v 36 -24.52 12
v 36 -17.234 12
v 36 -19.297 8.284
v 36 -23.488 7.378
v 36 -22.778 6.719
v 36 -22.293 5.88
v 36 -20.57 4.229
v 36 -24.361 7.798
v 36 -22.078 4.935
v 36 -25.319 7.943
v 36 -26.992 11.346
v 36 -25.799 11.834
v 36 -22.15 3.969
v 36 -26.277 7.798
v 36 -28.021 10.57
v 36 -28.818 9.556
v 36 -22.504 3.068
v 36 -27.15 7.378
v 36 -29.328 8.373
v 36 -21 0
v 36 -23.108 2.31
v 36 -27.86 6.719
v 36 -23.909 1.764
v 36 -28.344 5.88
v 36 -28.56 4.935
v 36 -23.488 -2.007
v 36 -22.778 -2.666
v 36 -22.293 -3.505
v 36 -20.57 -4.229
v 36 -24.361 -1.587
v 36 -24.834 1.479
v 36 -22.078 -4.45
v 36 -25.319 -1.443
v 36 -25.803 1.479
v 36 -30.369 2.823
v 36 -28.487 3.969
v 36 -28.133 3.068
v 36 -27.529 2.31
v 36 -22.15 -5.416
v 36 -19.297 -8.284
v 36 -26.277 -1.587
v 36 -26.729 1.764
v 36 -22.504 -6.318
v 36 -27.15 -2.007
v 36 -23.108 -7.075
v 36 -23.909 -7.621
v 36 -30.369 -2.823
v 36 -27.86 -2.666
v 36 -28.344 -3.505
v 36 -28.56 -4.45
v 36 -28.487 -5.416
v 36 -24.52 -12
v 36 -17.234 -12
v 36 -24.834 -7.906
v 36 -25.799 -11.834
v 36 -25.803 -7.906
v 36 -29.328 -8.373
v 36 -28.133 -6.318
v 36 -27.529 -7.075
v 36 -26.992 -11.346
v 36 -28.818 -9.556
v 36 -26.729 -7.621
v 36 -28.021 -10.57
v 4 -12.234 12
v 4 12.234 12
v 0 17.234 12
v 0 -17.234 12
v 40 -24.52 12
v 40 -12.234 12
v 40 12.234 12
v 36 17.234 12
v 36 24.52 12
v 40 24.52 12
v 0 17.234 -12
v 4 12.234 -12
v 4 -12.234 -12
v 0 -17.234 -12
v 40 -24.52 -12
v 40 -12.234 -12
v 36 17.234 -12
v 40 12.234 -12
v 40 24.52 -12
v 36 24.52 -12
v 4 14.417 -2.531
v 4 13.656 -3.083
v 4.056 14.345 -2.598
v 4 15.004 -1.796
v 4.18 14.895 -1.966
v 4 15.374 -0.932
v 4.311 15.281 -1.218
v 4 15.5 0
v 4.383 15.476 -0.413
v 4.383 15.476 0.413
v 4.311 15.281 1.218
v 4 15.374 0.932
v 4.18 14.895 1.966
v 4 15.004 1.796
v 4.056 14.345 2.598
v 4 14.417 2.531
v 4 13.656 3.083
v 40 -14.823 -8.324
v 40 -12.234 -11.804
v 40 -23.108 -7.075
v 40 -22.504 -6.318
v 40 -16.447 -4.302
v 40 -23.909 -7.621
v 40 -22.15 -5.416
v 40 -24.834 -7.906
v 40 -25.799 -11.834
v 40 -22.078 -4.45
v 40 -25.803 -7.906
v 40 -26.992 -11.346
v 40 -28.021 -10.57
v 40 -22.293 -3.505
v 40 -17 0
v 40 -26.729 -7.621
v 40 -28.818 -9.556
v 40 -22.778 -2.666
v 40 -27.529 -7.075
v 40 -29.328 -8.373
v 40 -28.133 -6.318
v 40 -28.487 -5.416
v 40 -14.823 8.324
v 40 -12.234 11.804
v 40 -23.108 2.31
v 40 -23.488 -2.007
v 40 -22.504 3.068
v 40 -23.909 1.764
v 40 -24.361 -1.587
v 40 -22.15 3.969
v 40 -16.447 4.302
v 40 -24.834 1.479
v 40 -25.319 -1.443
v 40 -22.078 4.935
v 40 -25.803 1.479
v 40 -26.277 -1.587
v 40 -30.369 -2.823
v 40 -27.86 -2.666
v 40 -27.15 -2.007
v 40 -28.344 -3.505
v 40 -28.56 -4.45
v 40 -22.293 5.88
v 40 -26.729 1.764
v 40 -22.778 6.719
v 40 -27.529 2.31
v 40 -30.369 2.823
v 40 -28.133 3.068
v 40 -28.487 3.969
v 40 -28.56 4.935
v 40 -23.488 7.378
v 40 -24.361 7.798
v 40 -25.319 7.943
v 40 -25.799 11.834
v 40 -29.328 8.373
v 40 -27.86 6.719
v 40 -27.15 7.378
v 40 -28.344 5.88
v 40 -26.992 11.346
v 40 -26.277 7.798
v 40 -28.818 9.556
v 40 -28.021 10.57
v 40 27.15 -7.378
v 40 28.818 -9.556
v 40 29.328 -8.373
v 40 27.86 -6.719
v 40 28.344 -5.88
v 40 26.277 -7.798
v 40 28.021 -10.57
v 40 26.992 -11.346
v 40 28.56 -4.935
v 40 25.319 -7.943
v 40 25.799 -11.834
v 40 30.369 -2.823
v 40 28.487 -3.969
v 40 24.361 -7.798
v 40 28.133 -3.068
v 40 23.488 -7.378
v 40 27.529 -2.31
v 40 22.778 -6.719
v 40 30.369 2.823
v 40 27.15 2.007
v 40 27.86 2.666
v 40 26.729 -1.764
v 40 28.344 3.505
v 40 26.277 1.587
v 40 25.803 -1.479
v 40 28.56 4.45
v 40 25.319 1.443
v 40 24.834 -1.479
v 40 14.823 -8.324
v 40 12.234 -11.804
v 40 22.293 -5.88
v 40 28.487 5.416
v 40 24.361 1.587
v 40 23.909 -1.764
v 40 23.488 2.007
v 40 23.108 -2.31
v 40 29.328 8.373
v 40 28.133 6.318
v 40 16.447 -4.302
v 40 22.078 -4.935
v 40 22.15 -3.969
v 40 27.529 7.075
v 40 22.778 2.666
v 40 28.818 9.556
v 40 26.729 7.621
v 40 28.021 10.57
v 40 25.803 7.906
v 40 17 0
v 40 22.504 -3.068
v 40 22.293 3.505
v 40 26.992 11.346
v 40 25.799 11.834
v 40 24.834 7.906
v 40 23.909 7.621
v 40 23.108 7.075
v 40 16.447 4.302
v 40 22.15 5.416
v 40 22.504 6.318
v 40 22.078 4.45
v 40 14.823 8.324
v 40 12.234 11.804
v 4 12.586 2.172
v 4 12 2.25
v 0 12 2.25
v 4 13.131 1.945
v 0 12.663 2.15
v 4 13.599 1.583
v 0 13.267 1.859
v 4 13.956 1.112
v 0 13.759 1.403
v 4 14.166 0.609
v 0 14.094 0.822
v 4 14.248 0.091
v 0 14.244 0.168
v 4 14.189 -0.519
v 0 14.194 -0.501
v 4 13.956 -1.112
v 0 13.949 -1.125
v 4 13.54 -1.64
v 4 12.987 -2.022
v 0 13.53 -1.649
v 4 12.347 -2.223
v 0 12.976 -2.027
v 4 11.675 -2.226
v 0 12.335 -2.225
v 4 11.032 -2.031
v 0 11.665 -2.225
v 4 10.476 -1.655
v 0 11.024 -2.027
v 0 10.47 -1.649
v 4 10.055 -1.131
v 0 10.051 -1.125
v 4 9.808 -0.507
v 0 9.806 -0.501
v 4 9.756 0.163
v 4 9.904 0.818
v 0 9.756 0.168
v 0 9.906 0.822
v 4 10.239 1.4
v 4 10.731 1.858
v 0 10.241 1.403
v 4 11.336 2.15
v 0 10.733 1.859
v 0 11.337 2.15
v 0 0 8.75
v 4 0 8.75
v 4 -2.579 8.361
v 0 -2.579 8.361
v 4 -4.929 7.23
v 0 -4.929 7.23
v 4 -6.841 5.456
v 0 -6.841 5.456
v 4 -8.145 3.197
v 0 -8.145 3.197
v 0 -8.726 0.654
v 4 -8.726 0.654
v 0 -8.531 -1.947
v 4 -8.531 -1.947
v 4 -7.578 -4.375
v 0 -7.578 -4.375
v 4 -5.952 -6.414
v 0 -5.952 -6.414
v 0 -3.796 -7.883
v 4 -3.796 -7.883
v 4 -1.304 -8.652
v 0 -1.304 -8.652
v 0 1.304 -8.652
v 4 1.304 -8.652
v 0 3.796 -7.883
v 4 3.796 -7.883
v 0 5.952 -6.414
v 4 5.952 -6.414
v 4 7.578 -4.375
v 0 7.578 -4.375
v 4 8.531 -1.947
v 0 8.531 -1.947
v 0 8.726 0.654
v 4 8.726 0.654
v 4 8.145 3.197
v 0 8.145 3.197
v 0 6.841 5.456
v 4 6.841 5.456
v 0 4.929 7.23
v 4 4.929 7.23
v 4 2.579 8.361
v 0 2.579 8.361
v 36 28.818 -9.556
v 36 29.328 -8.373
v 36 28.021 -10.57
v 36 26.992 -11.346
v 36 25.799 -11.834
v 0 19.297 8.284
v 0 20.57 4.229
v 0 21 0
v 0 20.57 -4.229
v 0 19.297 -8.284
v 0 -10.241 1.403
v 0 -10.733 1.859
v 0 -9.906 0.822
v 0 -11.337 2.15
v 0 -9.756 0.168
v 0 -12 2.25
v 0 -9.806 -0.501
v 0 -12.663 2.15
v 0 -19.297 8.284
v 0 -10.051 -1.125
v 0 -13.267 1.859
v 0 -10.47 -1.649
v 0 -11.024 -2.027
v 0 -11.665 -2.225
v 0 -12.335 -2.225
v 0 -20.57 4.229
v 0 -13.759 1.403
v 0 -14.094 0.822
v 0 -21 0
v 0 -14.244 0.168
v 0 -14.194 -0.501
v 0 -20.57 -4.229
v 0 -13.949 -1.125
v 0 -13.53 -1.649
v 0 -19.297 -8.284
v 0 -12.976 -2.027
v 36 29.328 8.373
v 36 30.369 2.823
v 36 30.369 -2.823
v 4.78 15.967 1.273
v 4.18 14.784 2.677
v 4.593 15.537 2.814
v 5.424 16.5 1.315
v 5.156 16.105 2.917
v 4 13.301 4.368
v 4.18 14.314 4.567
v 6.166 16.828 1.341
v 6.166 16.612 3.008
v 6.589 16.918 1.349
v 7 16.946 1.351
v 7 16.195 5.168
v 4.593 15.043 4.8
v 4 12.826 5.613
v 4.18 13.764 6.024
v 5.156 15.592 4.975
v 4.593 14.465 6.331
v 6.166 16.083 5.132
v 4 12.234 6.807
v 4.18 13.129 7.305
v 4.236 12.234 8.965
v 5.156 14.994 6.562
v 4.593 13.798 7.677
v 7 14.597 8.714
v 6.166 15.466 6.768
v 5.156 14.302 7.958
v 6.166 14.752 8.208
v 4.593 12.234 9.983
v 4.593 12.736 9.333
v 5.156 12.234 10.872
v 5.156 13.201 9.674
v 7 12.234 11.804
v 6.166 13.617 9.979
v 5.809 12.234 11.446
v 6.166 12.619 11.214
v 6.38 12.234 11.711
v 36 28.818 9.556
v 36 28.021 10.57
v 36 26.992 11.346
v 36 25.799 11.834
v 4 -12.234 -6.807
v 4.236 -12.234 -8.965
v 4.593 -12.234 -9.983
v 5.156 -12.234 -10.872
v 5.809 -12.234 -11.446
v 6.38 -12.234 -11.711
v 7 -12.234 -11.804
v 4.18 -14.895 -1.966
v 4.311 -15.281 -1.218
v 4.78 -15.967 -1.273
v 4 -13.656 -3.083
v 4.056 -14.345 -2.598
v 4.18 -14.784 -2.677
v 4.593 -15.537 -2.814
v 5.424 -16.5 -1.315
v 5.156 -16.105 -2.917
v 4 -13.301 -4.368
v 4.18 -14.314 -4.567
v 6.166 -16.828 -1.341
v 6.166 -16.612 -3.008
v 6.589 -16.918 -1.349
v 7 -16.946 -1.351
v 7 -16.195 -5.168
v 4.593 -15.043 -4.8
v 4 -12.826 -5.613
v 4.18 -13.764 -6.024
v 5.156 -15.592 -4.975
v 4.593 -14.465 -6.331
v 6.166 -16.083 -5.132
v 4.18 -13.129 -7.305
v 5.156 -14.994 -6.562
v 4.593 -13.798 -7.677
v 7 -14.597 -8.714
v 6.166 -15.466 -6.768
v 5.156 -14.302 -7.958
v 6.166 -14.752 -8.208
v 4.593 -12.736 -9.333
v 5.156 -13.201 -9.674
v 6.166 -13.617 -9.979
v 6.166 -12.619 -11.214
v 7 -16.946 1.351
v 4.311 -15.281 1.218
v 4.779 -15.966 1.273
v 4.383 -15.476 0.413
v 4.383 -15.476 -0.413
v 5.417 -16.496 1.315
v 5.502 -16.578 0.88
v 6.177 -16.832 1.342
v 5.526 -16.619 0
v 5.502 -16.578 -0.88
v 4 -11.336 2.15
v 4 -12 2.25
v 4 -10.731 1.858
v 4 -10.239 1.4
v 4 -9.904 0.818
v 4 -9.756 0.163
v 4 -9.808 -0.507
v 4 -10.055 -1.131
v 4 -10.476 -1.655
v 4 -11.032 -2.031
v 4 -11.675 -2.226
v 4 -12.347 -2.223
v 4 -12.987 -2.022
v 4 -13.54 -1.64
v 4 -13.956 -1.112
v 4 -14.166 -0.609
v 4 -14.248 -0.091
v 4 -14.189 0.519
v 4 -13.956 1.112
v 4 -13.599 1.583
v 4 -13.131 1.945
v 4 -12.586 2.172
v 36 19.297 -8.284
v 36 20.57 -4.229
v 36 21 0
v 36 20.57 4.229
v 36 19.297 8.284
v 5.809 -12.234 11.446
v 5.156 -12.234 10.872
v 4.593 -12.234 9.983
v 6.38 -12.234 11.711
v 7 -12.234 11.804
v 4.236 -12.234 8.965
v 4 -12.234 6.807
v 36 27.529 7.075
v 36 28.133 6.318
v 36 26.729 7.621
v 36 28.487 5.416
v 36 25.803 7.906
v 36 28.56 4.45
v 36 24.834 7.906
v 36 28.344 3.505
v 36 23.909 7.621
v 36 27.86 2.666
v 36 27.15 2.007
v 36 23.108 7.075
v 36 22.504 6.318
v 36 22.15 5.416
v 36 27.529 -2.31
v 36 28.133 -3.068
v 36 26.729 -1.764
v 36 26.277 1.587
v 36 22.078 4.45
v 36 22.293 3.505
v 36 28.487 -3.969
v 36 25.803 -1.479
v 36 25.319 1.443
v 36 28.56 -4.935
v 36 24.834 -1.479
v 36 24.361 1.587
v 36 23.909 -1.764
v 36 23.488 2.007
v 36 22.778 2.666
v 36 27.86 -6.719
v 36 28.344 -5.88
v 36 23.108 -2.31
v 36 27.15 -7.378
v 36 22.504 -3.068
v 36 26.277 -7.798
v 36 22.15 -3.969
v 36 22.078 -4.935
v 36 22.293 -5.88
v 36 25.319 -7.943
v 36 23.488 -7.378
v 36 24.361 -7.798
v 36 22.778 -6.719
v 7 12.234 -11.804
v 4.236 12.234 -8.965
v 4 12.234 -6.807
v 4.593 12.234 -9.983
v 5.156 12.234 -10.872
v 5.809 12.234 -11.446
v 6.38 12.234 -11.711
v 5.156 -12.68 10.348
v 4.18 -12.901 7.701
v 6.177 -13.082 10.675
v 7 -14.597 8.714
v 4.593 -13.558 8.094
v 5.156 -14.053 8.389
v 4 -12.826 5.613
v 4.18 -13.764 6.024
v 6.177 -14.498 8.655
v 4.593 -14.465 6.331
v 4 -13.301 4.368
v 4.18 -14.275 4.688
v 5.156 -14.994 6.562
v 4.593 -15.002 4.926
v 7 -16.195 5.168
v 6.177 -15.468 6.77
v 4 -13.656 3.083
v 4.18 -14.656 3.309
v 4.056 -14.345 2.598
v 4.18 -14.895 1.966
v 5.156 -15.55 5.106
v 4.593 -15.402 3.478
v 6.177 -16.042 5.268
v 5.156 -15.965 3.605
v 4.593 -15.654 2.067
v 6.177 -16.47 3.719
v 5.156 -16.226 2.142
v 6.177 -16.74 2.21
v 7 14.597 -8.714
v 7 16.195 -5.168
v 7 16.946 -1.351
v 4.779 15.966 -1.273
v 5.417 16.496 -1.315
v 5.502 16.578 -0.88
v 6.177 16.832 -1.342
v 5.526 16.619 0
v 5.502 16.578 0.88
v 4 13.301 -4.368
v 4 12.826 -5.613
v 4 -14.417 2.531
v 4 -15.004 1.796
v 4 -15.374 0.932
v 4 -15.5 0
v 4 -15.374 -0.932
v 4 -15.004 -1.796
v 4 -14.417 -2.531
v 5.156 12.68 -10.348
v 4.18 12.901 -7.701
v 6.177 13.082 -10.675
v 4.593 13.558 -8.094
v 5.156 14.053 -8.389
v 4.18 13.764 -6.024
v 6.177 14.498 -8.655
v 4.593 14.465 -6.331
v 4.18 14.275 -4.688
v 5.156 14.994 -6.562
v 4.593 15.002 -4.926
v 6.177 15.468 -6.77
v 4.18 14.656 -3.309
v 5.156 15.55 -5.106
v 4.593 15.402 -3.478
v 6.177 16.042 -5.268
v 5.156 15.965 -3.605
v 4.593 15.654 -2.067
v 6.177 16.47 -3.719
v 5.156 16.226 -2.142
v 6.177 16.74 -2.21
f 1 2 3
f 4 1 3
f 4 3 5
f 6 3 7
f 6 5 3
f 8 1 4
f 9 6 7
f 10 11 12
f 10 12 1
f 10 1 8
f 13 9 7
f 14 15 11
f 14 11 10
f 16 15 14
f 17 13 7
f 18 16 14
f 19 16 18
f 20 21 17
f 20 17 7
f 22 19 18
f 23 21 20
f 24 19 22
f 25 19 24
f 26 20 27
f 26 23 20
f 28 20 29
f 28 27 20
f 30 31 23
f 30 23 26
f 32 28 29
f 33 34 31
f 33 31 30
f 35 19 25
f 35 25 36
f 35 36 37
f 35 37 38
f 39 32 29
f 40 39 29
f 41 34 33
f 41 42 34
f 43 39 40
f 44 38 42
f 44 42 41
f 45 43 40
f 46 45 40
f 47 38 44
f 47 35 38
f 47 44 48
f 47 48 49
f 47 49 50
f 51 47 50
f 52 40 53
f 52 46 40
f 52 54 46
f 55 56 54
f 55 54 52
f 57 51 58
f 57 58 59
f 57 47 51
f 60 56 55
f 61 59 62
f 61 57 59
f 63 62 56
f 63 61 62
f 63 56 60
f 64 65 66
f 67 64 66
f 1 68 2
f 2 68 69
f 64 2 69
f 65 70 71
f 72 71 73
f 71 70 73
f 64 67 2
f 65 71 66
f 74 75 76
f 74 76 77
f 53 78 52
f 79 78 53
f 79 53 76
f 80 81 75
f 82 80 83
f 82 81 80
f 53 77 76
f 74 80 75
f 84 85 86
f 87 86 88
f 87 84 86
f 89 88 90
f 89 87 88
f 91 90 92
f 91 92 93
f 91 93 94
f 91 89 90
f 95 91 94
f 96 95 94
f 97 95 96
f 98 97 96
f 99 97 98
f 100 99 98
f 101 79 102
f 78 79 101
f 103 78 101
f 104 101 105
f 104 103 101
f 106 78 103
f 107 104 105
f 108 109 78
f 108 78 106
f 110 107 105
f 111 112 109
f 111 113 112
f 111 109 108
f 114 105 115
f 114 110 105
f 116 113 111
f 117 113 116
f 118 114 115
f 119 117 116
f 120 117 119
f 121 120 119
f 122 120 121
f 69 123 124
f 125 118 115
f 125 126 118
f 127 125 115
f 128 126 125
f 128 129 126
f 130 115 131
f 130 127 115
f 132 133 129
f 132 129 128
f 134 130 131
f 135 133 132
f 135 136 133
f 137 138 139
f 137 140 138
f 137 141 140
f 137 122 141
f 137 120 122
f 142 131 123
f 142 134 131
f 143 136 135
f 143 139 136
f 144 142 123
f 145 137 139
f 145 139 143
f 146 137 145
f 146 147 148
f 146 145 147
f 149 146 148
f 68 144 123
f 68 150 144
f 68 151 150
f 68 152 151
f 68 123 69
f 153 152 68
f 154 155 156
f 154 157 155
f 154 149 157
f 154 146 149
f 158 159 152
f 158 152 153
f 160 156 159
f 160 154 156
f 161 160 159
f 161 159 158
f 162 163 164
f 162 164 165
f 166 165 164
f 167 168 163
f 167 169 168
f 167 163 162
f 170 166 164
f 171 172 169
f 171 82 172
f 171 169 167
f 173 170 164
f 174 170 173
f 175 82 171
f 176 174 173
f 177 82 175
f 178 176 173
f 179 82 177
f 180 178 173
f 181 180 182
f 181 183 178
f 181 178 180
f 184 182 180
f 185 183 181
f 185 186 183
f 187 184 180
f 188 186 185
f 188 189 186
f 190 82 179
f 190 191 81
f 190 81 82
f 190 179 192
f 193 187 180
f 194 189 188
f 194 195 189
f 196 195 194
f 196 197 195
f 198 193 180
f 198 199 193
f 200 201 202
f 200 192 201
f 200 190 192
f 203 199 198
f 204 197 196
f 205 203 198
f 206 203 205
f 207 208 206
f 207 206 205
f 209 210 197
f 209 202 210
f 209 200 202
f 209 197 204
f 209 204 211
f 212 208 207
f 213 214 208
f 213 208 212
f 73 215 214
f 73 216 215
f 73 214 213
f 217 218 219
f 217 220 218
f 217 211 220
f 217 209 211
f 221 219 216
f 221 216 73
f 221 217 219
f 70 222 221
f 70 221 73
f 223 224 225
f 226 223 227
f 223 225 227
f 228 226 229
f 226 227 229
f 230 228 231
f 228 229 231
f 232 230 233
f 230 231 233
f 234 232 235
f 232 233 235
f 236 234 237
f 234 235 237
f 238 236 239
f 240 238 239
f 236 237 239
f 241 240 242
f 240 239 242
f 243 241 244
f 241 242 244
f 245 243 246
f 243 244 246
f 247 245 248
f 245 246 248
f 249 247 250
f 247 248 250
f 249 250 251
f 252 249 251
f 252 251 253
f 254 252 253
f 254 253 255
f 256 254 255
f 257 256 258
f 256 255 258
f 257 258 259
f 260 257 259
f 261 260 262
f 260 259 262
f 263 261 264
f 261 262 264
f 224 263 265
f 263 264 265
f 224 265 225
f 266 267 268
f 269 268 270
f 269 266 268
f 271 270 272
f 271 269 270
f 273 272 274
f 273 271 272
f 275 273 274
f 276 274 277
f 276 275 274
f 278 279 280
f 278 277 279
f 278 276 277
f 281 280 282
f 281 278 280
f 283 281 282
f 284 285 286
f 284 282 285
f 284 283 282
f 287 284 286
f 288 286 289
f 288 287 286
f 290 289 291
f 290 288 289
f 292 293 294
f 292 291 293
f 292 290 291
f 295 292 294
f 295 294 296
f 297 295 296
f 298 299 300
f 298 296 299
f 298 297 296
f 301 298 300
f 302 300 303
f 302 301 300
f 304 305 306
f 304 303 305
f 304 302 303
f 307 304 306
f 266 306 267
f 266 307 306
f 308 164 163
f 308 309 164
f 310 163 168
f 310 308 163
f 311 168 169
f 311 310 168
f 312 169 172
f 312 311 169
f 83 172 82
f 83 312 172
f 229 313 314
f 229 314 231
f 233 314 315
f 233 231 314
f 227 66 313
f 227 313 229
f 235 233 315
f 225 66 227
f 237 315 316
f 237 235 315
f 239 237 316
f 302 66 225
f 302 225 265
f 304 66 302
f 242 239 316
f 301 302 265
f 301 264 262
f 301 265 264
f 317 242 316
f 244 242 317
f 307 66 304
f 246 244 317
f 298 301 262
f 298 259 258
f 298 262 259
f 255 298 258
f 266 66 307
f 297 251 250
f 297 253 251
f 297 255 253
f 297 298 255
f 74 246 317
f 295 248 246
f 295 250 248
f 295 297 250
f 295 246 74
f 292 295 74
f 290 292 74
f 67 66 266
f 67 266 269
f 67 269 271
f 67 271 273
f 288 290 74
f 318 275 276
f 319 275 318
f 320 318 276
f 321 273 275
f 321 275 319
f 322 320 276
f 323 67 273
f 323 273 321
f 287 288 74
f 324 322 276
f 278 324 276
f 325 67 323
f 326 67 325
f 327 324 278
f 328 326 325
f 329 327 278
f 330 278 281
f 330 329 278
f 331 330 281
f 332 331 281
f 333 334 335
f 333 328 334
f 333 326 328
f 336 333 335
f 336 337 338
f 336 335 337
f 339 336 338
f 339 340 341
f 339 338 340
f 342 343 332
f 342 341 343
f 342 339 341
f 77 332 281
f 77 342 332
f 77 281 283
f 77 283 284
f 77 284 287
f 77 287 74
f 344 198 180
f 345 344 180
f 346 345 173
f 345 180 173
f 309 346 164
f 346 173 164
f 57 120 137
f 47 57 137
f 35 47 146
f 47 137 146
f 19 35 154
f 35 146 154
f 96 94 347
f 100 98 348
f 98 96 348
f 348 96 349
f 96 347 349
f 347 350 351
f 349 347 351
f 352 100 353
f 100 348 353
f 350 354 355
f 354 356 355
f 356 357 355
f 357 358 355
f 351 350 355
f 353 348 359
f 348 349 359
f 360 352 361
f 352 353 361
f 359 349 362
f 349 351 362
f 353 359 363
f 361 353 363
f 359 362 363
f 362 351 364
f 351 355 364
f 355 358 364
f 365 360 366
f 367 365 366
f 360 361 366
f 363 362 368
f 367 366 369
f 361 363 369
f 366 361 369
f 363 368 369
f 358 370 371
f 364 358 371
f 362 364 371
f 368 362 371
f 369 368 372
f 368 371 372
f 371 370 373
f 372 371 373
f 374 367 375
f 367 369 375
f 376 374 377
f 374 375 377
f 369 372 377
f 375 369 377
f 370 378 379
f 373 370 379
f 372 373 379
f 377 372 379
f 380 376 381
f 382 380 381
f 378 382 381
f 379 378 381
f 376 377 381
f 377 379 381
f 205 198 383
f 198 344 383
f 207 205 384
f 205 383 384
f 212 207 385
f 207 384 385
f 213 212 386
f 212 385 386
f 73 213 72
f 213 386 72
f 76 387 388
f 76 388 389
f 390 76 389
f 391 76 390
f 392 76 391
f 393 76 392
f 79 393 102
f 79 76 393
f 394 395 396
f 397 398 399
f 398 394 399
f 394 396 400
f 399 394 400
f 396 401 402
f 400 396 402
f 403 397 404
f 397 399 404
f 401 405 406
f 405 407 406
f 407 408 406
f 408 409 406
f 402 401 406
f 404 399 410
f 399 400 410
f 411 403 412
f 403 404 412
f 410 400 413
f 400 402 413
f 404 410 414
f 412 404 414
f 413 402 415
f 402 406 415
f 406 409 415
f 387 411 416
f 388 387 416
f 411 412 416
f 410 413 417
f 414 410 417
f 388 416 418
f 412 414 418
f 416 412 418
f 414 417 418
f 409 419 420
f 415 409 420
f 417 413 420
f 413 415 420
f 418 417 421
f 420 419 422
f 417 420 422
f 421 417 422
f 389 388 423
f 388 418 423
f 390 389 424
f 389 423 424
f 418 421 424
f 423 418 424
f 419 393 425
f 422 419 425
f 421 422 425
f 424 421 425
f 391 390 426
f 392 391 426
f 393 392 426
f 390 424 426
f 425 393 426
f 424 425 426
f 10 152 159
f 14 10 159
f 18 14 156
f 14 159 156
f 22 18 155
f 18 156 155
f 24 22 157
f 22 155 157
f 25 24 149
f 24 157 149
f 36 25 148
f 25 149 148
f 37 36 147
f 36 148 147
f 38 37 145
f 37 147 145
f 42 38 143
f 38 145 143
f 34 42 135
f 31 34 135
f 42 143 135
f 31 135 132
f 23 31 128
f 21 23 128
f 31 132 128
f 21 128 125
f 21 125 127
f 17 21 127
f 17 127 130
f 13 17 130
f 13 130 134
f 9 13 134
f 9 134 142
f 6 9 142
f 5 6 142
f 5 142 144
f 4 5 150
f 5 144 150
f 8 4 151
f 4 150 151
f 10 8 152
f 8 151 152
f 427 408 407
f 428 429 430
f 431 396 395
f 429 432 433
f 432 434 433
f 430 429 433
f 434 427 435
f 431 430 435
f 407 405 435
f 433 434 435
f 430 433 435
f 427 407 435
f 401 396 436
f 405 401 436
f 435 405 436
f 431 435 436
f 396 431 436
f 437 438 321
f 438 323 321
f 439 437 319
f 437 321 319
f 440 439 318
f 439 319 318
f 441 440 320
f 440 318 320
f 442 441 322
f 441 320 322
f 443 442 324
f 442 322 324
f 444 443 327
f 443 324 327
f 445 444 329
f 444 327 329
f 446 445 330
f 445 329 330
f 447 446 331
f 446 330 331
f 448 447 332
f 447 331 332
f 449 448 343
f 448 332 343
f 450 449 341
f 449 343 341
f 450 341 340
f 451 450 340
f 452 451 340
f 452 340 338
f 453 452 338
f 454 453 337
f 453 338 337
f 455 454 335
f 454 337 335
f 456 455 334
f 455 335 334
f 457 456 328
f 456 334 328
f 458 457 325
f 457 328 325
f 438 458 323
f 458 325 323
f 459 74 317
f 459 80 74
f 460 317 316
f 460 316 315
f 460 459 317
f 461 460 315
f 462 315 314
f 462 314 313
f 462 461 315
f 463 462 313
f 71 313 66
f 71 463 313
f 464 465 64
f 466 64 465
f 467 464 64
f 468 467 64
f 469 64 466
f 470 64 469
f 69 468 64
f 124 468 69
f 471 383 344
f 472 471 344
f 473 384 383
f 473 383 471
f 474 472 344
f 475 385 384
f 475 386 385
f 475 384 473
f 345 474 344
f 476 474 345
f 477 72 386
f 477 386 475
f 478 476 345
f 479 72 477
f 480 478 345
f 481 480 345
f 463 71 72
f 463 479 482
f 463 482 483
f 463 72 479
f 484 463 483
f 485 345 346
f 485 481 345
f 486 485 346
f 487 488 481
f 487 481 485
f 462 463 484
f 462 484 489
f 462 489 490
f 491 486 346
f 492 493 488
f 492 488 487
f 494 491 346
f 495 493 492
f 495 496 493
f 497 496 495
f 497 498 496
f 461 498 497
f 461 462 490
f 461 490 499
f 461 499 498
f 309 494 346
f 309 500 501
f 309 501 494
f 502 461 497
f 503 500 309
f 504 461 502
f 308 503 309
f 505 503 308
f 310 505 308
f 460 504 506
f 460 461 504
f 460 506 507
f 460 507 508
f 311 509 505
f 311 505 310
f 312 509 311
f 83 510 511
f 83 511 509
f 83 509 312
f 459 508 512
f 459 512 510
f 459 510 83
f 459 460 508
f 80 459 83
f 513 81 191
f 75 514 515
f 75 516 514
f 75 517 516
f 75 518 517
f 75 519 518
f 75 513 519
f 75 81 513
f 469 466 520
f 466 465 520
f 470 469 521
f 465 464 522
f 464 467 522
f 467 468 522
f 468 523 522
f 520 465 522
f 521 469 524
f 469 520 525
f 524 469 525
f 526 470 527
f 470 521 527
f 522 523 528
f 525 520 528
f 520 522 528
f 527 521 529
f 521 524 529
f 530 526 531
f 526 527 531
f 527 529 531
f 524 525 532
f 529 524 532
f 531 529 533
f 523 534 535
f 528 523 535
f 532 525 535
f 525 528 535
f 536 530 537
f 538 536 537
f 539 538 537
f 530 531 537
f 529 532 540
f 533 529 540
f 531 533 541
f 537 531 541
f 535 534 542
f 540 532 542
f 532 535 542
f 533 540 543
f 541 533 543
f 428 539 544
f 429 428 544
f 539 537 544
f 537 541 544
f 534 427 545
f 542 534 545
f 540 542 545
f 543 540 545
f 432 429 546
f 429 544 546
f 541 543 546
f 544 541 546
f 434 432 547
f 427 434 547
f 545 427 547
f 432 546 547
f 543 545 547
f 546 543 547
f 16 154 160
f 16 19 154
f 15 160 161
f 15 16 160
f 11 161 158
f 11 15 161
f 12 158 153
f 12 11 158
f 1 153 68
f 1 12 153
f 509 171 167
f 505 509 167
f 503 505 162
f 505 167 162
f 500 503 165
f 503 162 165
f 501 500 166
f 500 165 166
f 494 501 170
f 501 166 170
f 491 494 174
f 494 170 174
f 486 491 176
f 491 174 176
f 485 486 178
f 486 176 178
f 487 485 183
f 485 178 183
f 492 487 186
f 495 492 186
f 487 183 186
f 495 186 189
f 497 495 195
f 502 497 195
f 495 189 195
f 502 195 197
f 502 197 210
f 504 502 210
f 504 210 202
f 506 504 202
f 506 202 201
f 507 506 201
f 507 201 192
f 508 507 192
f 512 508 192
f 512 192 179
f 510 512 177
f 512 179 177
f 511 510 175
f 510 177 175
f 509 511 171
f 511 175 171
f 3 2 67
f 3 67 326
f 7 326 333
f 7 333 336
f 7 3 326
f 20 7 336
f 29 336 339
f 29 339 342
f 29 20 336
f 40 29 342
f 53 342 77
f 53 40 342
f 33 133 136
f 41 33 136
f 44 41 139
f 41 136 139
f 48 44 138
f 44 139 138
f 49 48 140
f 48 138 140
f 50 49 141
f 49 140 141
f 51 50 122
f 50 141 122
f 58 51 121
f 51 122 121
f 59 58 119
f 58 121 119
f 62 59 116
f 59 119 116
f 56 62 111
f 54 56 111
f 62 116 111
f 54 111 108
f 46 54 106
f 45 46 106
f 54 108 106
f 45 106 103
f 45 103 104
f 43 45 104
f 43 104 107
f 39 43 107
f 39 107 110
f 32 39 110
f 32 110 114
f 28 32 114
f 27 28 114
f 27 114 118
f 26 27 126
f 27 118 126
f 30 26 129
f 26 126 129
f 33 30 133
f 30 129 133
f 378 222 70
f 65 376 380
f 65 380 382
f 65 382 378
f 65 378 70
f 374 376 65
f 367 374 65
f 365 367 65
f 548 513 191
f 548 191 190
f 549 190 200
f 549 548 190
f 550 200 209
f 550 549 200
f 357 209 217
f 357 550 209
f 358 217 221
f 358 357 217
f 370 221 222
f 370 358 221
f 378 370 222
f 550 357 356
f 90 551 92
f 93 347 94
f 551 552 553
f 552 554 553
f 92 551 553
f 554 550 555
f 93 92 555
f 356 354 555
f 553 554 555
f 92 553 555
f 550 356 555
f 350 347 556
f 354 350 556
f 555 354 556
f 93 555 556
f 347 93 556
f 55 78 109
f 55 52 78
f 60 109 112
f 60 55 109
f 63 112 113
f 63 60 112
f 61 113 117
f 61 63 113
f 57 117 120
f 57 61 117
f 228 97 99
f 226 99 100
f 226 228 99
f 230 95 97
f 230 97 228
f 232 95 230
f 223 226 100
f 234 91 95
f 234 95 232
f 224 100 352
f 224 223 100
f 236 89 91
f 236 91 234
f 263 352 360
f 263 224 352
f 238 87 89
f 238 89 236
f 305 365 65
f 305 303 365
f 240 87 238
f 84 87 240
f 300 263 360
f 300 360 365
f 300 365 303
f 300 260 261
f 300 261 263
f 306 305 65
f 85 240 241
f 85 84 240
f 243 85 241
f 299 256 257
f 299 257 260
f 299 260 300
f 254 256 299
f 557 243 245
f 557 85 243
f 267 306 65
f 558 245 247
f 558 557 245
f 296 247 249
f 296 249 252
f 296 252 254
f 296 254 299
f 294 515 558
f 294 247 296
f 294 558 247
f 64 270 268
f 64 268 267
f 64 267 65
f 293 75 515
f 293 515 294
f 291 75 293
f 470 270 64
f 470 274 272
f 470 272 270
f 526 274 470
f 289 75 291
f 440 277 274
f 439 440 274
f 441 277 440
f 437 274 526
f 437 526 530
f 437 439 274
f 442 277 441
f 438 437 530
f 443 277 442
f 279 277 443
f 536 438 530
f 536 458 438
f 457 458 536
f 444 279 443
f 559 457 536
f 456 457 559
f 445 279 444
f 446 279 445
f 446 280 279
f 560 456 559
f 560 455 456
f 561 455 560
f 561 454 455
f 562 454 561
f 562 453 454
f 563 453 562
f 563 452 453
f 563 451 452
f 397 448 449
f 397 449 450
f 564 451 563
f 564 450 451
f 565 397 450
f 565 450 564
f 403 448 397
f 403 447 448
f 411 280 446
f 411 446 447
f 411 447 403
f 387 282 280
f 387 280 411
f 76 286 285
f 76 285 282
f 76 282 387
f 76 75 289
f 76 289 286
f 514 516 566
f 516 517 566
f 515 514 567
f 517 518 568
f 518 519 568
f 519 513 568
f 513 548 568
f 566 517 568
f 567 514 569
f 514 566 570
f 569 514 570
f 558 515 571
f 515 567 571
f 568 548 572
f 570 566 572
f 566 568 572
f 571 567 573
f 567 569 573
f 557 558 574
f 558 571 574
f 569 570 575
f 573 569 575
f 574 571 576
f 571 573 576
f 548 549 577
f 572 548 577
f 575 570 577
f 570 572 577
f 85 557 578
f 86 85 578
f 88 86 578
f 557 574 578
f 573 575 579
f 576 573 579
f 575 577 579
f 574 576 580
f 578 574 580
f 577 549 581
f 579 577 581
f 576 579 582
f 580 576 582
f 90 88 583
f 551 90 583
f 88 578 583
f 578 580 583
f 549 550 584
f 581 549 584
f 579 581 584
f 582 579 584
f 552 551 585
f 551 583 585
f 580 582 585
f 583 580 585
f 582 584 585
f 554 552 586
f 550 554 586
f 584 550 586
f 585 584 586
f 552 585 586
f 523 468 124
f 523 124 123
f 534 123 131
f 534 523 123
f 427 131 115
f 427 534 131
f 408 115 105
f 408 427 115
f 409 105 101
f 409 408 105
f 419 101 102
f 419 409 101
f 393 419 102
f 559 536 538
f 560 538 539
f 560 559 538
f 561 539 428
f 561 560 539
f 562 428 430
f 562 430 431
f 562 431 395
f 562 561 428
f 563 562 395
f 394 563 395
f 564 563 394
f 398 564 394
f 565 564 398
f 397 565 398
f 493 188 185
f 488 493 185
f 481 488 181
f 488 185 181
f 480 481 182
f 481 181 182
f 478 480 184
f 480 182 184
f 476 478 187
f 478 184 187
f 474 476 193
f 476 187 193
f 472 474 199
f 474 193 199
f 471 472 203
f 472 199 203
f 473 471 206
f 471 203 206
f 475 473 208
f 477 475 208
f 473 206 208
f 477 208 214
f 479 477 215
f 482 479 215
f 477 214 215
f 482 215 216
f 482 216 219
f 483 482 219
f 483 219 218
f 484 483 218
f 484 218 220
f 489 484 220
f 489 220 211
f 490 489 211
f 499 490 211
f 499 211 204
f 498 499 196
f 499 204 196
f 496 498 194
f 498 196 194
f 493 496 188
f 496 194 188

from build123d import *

# Parameters (mm, degrees)
SKETCH2_R               = 3.25
BOSS_EXTRUDE1_DEPTH     = 4
CIRPATTERN2_COUNT       = 2
CUT_EXTRUDE4_DEPTH      = 53.060061468
CUT_EXTRUDE4_DEPTH_BACK = 53.060061468
SKETCH6_W               = 12.790505544
SKETCH6_H               = 56.080299572
SKETCH6_W_2             = 13.13165929
CUT_EXTRUDE5_DEPTH      = 56.733742024
CUT_EXTRUDE5_DEPTH_BACK = 56.733742024
SKETCH8_R               = 2.25
CUT_EXTRUDE6_DEPTH      = 10
FILLET1_R               = 3
SKETCH9_R               = 3.5
CUT_EXTRUDE7_DEPTH      = 30
FILLET2_R               = 5


with BuildPart() as part:
    # Sketch1 → Revolve1 (revolve)
    with BuildSketch(Plane.XY, mode=Mode.PRIVATE) as revolve1_sk:
        Polygon((0, 8.75), (0, 21), (36, 21), (36, 22), (40, 22), (40, 17), (4, 17), (4, 8.75), align=None)
    revolve(revolve1_sk.sketch.rotate(Axis((0, 0, 0), (1, 0, 0)), 90), axis=Axis((0, 0, 0), (1, 0, 0)))

    # Sketch2 → Boss-Extrude1 (add)
    with BuildSketch(Plane(origin=(40, 0, 0), x_dir=(0, 0, -1), z_dir=(1, 0, 0))):
        with BuildLine():
            Line((12, 28.040149786), (12, 18.439088915))
            ThreePointArc((12, 18.439088915), (0, 22), (-12, 18.439088915))
            Line((-12, 18.439088915), (-12, 28.040149786))
            ThreePointArc((-12, 28.040149786), (0, 30.5), (12, 28.040149786))
        make_face()
        with Locations((-4.692554767, 25.318815726)):
            Circle(SKETCH2_R, mode=Mode.SUBTRACT)
        with Locations((4.692554767, 25.318815726)):
            Circle(SKETCH2_R, mode=Mode.SUBTRACT)
    boss_extrude1 = extrude(amount=-BOSS_EXTRUDE1_DEPTH)

    # CirPattern2: Boss-Extrude1 ×2 about axis
    cirpattern2_axis = Axis((0, 0, 0), (1, 0, 0))
    for i in range(1, CIRPATTERN2_COUNT):
        add(boss_extrude1.rotate(cirpattern2_axis, i * 360 / CIRPATTERN2_COUNT))

    # Sketch6 → Cut-Extrude4 (cut, two sides: drawn at the far end of the back side and taken through both)
    with BuildSketch(Plane.ZY.offset(-36).offset(-CUT_EXTRUDE4_DEPTH_BACK)):
        with Locations((-18.395252772, 0)):
            Rectangle(SKETCH6_W, SKETCH6_H)
        with Locations((18.565829645, 0)):
            Rectangle(SKETCH6_W_2, SKETCH6_H)
    extrude(amount=CUT_EXTRUDE4_DEPTH + CUT_EXTRUDE4_DEPTH_BACK, mode=Mode.SUBTRACT)

    # Sketch7 → Cut-Extrude5 (cut, two sides: drawn at the far end of the back side and taken through both)
    with BuildSketch(Plane.XY.offset(12).offset(-CUT_EXTRUDE5_DEPTH_BACK)):
        Polygon((40, 0), (40, 12.23368794), (4, 12.23368794), (4, -12.23368794), (40, -12.23368794), align=None)
    extrude(amount=CUT_EXTRUDE5_DEPTH + CUT_EXTRUDE5_DEPTH_BACK, mode=Mode.SUBTRACT)

    # Sketch8 → Cut-Extrude6 (cut)
    with BuildSketch(Plane.ZY):
        with Locations((0, -12)):
            Circle(SKETCH8_R)
        with Locations((0, 12)):
            Circle(SKETCH8_R)
    extrude(amount=-CUT_EXTRUDE6_DEPTH, mode=Mode.SUBTRACT)

    # Fillet1
    fillet1_edges = [part.edges().sort_by_distance(p)[0] for p in [
        (4, -17, 0),
        (4, 17, 0),
    ]]
    fillet(fillet1_edges, radius=FILLET1_R)

    # Sketch9 → Cut-Extrude7 (cut)
    with BuildSketch(Plane(origin=(4, 0, 0), x_dir=(0, 0, -1), z_dir=(1, 0, 0))):
        with Locations((0, 12)):
            Circle(SKETCH9_R)
        with Locations((0, -12)):
            Circle(SKETCH9_R)
    extrude(amount=CUT_EXTRUDE7_DEPTH, mode=Mode.SUBTRACT)

    # Fillet2
    fillet2_edges = [part.edges().sort_by_distance(p)[0] for p in [
        (38, 28.040149786, -12),
        (38, 28.040149786, 12),
        (38, -28.040149786, 12),
        (38, -28.040149786, -12),
    ]]
    fillet(fillet2_edges, radius=FILLET2_R)


solid = part.part
